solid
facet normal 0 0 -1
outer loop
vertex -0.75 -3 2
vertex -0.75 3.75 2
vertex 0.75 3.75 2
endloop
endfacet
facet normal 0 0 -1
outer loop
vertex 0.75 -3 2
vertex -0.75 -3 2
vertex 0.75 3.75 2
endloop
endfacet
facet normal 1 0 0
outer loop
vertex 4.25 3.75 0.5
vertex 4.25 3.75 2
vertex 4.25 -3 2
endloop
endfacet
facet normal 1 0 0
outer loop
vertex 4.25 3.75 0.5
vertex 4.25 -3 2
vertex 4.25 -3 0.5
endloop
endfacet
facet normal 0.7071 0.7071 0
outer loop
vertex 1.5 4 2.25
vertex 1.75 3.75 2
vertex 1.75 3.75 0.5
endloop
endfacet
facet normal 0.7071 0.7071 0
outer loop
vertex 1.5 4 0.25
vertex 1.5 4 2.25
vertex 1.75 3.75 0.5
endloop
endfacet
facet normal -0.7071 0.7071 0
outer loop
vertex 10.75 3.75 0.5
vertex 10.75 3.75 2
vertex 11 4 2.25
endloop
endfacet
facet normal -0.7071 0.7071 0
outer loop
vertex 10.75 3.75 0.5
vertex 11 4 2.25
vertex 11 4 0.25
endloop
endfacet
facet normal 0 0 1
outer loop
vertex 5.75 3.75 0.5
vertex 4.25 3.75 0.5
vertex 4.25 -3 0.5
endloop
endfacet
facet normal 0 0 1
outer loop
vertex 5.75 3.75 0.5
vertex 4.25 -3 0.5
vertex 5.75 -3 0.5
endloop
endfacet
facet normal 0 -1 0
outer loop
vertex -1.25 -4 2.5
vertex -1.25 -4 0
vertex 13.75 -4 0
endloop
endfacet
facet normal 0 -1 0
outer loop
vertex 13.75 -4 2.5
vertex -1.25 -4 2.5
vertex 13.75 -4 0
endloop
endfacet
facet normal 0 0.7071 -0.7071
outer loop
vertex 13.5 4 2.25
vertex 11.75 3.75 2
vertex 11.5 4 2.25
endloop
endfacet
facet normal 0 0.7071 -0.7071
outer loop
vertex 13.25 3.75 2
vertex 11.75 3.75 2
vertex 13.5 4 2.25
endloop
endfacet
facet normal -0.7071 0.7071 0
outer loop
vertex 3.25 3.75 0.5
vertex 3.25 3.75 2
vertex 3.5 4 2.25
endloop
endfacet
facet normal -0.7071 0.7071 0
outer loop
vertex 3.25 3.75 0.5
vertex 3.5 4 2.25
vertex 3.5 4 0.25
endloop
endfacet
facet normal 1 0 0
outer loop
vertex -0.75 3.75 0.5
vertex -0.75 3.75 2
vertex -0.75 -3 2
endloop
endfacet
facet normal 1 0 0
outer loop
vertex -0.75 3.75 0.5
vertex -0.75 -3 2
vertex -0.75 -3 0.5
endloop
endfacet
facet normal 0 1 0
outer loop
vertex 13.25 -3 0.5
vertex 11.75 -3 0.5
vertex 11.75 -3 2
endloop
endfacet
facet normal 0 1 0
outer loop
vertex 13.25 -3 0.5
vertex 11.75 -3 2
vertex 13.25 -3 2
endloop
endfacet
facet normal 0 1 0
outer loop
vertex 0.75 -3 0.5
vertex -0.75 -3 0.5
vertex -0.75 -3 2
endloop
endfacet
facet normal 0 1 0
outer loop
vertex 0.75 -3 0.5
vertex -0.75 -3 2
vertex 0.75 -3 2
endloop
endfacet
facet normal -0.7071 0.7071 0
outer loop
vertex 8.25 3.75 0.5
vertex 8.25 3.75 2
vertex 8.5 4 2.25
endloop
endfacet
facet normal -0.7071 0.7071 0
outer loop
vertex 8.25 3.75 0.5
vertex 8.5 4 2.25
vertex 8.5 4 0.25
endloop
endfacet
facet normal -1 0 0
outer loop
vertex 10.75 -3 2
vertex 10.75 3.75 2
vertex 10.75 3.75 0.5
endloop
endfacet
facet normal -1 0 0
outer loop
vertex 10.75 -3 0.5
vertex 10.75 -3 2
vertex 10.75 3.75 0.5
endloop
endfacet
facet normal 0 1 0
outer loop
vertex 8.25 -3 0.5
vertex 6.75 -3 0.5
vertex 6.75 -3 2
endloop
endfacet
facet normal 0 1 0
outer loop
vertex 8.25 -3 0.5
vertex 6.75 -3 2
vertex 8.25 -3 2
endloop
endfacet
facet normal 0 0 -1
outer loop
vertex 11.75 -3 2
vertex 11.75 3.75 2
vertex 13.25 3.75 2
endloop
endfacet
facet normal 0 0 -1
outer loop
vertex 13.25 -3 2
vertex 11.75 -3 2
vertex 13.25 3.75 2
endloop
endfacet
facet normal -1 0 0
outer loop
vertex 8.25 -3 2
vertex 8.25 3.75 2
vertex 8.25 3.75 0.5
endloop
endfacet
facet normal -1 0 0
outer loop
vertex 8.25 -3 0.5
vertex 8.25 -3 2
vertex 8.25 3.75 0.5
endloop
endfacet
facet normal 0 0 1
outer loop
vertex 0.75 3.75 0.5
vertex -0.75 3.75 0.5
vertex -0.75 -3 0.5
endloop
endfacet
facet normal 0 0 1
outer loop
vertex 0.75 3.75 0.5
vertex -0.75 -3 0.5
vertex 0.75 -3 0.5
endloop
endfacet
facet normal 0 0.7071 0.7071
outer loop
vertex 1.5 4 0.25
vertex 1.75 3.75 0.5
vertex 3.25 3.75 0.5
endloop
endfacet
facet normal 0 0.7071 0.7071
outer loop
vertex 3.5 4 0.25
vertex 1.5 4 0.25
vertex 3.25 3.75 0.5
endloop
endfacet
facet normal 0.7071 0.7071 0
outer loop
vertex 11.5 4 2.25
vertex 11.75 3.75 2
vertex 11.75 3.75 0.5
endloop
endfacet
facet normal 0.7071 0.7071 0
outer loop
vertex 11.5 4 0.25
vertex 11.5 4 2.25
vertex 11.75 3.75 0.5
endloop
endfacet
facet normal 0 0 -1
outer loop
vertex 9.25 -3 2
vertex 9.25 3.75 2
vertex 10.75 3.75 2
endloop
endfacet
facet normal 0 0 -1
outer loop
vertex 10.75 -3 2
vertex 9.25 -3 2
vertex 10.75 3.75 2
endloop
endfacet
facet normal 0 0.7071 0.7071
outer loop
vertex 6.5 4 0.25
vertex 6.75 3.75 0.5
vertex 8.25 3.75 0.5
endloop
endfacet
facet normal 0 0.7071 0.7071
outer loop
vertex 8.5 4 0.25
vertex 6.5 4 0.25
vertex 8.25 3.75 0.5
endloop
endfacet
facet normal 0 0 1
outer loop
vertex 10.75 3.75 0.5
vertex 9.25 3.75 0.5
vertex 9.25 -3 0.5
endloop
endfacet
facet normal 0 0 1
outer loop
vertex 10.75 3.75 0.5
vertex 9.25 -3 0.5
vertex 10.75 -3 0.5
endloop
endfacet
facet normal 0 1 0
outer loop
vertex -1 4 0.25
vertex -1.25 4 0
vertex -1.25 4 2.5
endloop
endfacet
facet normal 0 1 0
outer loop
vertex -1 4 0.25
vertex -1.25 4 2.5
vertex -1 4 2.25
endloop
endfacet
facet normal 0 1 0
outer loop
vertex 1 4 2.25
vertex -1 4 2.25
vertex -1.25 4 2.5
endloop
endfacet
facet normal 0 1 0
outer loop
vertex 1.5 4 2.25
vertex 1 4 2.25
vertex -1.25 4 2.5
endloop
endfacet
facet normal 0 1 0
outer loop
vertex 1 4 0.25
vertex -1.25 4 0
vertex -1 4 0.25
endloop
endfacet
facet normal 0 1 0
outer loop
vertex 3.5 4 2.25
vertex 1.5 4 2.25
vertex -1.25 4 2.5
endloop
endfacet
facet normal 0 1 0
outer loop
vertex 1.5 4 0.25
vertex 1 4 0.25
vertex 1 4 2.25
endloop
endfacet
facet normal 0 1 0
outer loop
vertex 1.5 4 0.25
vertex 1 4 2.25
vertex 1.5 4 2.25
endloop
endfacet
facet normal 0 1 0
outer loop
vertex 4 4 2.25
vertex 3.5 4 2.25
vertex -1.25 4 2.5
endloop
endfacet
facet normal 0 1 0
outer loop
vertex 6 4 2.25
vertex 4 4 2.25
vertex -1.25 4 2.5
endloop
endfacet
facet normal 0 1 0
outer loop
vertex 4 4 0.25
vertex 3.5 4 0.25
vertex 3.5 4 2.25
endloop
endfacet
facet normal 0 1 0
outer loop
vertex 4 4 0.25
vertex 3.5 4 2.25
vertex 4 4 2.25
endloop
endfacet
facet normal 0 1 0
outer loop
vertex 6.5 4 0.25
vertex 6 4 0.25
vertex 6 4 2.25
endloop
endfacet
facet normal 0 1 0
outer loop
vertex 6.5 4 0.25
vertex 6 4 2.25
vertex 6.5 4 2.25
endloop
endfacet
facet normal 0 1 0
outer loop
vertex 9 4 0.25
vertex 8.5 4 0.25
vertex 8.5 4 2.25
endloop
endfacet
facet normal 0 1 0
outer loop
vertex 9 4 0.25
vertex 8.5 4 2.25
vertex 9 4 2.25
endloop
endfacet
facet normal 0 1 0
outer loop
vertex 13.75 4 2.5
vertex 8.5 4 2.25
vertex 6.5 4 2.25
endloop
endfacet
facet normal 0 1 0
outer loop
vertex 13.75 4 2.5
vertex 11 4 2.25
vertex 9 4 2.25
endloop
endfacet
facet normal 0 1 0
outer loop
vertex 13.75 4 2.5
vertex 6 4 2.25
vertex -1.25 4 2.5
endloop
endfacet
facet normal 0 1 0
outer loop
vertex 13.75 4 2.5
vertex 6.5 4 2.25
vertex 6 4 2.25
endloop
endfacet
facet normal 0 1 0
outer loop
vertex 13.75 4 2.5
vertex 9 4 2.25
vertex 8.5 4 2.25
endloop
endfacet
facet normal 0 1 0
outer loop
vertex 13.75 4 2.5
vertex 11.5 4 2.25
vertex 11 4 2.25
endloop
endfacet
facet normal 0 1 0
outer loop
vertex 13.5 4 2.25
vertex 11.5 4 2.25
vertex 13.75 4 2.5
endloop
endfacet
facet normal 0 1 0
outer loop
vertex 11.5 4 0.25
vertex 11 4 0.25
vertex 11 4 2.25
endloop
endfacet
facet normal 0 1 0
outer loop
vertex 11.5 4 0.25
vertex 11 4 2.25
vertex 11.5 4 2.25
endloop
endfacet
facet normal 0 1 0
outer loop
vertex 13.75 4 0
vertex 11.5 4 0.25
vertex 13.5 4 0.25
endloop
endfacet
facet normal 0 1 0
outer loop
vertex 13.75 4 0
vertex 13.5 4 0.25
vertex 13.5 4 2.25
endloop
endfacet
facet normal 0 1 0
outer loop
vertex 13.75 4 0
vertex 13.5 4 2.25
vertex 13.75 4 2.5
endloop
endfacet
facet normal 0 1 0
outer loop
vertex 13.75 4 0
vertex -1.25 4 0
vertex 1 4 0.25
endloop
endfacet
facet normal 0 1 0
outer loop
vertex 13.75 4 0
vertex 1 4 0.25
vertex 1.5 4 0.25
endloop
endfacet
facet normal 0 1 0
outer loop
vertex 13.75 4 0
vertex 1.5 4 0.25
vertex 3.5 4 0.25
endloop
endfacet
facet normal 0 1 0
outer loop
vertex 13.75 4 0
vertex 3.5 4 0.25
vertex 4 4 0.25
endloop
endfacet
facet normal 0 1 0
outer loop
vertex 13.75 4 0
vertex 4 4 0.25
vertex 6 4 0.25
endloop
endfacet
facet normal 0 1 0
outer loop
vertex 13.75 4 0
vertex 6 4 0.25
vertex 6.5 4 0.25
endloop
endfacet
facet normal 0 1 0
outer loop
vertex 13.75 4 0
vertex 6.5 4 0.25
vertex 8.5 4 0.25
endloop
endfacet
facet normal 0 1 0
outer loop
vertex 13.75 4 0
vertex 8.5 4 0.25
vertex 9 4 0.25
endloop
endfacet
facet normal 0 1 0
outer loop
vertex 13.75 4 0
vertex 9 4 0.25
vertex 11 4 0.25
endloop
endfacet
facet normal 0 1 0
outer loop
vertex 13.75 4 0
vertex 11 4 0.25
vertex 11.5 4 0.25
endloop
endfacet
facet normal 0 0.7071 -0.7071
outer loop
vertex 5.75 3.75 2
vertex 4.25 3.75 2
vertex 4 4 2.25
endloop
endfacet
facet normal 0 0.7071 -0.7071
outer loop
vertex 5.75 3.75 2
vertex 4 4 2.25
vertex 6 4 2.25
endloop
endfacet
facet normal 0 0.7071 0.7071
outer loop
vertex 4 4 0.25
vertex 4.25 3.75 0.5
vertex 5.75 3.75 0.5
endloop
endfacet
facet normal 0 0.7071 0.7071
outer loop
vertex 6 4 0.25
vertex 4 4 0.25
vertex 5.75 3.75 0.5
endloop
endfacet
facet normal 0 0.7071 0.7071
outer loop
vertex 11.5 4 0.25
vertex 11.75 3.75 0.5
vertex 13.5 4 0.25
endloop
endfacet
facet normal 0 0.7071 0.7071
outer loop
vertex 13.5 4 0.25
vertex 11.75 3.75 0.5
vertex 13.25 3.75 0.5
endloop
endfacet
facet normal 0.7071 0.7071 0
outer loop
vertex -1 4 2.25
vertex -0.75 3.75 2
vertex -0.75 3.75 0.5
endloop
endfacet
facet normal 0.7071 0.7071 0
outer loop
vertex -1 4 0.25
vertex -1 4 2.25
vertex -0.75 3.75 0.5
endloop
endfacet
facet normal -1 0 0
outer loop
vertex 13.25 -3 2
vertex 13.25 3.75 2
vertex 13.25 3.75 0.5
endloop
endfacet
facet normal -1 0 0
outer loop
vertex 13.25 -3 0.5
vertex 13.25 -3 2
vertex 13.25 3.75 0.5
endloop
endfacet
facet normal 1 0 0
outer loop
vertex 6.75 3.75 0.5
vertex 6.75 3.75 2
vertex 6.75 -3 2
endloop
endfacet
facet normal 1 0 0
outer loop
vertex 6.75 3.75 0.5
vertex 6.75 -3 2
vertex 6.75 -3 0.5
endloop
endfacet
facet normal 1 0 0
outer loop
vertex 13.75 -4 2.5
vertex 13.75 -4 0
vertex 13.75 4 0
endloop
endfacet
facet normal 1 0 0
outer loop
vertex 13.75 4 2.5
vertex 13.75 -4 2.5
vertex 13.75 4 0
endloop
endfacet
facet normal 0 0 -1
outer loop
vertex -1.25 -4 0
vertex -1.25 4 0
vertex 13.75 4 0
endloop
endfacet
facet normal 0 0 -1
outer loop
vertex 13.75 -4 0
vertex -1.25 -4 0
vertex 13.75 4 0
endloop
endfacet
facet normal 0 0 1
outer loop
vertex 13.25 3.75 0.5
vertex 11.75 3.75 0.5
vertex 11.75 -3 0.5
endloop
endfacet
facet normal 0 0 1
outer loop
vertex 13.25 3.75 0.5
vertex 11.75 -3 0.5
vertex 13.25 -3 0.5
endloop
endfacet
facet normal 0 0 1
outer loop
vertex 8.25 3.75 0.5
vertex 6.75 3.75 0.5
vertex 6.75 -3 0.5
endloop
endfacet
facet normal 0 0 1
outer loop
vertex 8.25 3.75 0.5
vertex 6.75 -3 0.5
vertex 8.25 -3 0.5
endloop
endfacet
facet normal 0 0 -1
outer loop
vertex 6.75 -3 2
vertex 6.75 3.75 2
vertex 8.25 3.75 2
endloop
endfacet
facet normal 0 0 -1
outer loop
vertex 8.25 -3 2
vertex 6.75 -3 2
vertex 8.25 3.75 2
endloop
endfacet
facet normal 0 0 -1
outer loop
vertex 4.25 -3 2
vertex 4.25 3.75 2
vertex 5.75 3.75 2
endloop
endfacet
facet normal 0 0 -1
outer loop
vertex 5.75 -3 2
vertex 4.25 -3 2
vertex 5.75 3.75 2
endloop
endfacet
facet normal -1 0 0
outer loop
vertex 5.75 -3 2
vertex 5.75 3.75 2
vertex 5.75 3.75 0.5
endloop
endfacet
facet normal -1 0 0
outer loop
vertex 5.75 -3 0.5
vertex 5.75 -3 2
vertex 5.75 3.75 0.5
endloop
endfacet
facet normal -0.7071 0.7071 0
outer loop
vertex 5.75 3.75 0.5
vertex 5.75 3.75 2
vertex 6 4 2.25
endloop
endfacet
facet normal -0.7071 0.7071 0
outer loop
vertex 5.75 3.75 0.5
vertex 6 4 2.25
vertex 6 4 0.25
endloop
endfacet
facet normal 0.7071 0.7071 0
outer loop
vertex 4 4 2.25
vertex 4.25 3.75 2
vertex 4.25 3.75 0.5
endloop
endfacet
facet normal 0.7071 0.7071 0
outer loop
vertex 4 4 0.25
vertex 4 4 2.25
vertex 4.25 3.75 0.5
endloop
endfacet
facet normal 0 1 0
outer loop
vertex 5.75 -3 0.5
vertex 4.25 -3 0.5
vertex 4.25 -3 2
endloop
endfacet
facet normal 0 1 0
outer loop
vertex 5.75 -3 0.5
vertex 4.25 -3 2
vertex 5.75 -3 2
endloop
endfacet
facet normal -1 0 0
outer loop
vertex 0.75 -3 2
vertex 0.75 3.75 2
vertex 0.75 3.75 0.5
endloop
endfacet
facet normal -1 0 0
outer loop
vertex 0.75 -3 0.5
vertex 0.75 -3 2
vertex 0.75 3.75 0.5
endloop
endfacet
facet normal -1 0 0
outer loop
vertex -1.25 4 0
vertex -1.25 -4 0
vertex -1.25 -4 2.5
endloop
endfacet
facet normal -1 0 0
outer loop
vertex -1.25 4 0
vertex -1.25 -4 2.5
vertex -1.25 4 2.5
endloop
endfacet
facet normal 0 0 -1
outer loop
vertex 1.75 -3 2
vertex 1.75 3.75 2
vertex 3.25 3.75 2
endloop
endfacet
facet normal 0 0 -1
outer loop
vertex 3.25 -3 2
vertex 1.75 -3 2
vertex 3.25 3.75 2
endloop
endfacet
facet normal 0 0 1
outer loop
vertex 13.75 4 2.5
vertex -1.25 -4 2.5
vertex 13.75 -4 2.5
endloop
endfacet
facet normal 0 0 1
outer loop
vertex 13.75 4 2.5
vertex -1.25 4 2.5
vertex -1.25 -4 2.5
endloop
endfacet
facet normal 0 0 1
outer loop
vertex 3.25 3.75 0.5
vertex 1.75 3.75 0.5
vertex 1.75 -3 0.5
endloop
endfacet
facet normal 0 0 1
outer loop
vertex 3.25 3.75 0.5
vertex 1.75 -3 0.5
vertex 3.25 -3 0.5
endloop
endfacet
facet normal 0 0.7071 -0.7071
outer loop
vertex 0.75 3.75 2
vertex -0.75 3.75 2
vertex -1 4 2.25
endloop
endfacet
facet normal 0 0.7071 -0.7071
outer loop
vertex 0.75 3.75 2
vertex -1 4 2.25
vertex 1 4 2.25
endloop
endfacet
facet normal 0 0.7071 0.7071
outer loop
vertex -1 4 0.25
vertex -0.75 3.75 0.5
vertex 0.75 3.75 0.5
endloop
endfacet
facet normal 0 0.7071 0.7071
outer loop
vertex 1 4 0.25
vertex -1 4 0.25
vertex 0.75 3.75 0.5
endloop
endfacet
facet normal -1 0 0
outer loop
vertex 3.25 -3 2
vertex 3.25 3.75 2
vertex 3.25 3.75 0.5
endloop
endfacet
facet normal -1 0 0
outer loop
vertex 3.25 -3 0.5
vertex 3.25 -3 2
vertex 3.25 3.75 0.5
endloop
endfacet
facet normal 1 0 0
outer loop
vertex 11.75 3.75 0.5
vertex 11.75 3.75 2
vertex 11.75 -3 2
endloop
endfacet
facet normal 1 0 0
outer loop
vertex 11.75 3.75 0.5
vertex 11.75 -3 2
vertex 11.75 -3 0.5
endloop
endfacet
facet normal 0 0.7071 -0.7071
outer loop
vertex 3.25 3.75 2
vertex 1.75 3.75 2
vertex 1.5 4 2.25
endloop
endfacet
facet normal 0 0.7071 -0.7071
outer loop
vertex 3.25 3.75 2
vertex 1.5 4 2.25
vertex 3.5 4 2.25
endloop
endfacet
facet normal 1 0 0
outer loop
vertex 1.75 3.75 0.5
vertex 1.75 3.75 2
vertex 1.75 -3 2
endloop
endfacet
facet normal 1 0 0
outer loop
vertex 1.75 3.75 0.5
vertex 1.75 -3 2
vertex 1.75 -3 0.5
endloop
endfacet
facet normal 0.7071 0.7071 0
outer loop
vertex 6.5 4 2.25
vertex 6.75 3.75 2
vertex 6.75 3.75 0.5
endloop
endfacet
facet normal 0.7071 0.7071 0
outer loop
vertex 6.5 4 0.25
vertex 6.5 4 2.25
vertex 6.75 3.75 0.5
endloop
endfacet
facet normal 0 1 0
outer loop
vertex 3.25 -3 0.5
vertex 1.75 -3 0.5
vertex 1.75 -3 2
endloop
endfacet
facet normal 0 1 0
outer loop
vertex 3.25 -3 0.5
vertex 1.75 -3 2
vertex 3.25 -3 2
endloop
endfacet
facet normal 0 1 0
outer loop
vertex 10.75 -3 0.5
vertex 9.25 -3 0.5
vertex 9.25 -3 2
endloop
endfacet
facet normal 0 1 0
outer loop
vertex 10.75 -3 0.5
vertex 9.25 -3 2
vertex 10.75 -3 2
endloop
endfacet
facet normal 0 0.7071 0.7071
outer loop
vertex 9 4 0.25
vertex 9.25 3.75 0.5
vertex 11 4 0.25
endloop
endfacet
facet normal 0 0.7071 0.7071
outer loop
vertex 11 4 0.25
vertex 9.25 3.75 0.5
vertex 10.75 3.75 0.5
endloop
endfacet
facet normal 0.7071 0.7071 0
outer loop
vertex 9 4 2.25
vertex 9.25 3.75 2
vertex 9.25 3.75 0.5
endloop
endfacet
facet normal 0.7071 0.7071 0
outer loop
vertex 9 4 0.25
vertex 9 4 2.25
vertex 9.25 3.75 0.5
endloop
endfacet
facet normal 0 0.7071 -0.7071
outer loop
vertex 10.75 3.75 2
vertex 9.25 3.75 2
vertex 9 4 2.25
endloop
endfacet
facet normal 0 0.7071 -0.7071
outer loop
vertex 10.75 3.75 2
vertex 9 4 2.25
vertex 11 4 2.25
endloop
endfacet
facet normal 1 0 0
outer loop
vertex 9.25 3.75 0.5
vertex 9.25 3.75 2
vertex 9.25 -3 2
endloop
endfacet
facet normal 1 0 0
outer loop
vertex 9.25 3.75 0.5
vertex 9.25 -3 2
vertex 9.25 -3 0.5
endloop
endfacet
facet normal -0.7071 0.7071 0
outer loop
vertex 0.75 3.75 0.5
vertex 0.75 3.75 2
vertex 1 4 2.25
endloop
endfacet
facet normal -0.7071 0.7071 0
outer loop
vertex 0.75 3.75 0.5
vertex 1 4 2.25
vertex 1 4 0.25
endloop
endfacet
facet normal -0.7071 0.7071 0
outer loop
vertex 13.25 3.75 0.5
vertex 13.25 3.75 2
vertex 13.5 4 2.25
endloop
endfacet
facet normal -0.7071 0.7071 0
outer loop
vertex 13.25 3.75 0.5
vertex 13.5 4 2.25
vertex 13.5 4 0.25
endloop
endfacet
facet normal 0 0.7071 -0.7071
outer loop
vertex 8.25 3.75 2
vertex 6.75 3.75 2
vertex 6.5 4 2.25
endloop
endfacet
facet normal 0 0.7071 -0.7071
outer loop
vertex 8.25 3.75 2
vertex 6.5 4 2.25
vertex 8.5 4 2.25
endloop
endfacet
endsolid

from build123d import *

# Parameters (mm, degrees)
SKETCH1_W                  = 2.5
SKETCH1_H                  = 8
BOSS_EXTRUDE1_DEPTH        = 2.5
SKETCH2_W                  = 1.5
SKETCH2_H                  = 1.5
CUT_EXTRUDE2_DEPTH         = 7
CHAMFER3_SIZE              = 0.25
LPATTERN2_COUNT            = 6
LPATTERN2_PITCH            = 2.5
CHAMFER3_OF_LPATTERN2_SIZE = 0.25


with BuildPart() as part:
    # Sketch1 → Boss-Extrude1 (new body)
    with BuildSketch(Plane.XY):
        Rectangle(SKETCH1_W, SKETCH1_H)
    boss_extrude1 = extrude(amount=BOSS_EXTRUDE1_DEPTH)

    # Sketch2 → Cut-Extrude2 (cut)
    with BuildSketch(Plane(origin=(0, 4, 0), x_dir=(1, 0, 0), z_dir=(0, 1, 0))):
        with Locations((0, -1.25)):
            Rectangle(SKETCH2_W, SKETCH2_H)
    cut_extrude2 = extrude(amount=-CUT_EXTRUDE2_DEPTH, mode=Mode.SUBTRACT)

    # Chamfer3
    chamfer3_edges = [part.edges().sort_by_distance(p)[0] for p in [
        (0, 4, 2),
        (0.75, 4, 1.25),
        (0, 4, 0.5),
        (-0.75, 4, 1.25),
    ]]
    chamfer(chamfer3_edges, length=CHAMFER3_SIZE)

    # LPattern2: Boss-Extrude1, Cut-Extrude2 ×6
    with Locations(*[(i * LPATTERN2_PITCH, 0, 0) for i in range(1, LPATTERN2_COUNT)]):
        add(boss_extrude1)
        add(cut_extrude2, mode=Mode.SUBTRACT)

    # Chamfer3 of LPattern2
    chamfer3_of_lpattern2_edges = [part.edges().sort_by_distance(p)[0] for p in [
        (2.5, 4, 2),
        (3.25, 4, 1.25),
        (2.5, 4, 0.5),
        (1.75, 4, 1.25),
        (5, 4, 2),
        (5.75, 4, 1.25),
        (5, 4, 0.5),
        (4.25, 4, 1.25),
        (7.5, 4, 2),
        (8.25, 4, 1.25),
        (7.5, 4, 0.5),
        (6.75, 4, 1.25),
        (10, 4, 2),
        (10.75, 4, 1.25),
        (10, 4, 0.5),
        (9.25, 4, 1.25),
        (12.5, 4, 2),
        (13.25, 4, 1.25),
        (12.5, 4, 0.5),
        (11.75, 4, 1.25),
    ]]
    chamfer(chamfer3_of_lpattern2_edges, length=CHAMFER3_OF_LPATTERN2_SIZE)


solid = part.part
